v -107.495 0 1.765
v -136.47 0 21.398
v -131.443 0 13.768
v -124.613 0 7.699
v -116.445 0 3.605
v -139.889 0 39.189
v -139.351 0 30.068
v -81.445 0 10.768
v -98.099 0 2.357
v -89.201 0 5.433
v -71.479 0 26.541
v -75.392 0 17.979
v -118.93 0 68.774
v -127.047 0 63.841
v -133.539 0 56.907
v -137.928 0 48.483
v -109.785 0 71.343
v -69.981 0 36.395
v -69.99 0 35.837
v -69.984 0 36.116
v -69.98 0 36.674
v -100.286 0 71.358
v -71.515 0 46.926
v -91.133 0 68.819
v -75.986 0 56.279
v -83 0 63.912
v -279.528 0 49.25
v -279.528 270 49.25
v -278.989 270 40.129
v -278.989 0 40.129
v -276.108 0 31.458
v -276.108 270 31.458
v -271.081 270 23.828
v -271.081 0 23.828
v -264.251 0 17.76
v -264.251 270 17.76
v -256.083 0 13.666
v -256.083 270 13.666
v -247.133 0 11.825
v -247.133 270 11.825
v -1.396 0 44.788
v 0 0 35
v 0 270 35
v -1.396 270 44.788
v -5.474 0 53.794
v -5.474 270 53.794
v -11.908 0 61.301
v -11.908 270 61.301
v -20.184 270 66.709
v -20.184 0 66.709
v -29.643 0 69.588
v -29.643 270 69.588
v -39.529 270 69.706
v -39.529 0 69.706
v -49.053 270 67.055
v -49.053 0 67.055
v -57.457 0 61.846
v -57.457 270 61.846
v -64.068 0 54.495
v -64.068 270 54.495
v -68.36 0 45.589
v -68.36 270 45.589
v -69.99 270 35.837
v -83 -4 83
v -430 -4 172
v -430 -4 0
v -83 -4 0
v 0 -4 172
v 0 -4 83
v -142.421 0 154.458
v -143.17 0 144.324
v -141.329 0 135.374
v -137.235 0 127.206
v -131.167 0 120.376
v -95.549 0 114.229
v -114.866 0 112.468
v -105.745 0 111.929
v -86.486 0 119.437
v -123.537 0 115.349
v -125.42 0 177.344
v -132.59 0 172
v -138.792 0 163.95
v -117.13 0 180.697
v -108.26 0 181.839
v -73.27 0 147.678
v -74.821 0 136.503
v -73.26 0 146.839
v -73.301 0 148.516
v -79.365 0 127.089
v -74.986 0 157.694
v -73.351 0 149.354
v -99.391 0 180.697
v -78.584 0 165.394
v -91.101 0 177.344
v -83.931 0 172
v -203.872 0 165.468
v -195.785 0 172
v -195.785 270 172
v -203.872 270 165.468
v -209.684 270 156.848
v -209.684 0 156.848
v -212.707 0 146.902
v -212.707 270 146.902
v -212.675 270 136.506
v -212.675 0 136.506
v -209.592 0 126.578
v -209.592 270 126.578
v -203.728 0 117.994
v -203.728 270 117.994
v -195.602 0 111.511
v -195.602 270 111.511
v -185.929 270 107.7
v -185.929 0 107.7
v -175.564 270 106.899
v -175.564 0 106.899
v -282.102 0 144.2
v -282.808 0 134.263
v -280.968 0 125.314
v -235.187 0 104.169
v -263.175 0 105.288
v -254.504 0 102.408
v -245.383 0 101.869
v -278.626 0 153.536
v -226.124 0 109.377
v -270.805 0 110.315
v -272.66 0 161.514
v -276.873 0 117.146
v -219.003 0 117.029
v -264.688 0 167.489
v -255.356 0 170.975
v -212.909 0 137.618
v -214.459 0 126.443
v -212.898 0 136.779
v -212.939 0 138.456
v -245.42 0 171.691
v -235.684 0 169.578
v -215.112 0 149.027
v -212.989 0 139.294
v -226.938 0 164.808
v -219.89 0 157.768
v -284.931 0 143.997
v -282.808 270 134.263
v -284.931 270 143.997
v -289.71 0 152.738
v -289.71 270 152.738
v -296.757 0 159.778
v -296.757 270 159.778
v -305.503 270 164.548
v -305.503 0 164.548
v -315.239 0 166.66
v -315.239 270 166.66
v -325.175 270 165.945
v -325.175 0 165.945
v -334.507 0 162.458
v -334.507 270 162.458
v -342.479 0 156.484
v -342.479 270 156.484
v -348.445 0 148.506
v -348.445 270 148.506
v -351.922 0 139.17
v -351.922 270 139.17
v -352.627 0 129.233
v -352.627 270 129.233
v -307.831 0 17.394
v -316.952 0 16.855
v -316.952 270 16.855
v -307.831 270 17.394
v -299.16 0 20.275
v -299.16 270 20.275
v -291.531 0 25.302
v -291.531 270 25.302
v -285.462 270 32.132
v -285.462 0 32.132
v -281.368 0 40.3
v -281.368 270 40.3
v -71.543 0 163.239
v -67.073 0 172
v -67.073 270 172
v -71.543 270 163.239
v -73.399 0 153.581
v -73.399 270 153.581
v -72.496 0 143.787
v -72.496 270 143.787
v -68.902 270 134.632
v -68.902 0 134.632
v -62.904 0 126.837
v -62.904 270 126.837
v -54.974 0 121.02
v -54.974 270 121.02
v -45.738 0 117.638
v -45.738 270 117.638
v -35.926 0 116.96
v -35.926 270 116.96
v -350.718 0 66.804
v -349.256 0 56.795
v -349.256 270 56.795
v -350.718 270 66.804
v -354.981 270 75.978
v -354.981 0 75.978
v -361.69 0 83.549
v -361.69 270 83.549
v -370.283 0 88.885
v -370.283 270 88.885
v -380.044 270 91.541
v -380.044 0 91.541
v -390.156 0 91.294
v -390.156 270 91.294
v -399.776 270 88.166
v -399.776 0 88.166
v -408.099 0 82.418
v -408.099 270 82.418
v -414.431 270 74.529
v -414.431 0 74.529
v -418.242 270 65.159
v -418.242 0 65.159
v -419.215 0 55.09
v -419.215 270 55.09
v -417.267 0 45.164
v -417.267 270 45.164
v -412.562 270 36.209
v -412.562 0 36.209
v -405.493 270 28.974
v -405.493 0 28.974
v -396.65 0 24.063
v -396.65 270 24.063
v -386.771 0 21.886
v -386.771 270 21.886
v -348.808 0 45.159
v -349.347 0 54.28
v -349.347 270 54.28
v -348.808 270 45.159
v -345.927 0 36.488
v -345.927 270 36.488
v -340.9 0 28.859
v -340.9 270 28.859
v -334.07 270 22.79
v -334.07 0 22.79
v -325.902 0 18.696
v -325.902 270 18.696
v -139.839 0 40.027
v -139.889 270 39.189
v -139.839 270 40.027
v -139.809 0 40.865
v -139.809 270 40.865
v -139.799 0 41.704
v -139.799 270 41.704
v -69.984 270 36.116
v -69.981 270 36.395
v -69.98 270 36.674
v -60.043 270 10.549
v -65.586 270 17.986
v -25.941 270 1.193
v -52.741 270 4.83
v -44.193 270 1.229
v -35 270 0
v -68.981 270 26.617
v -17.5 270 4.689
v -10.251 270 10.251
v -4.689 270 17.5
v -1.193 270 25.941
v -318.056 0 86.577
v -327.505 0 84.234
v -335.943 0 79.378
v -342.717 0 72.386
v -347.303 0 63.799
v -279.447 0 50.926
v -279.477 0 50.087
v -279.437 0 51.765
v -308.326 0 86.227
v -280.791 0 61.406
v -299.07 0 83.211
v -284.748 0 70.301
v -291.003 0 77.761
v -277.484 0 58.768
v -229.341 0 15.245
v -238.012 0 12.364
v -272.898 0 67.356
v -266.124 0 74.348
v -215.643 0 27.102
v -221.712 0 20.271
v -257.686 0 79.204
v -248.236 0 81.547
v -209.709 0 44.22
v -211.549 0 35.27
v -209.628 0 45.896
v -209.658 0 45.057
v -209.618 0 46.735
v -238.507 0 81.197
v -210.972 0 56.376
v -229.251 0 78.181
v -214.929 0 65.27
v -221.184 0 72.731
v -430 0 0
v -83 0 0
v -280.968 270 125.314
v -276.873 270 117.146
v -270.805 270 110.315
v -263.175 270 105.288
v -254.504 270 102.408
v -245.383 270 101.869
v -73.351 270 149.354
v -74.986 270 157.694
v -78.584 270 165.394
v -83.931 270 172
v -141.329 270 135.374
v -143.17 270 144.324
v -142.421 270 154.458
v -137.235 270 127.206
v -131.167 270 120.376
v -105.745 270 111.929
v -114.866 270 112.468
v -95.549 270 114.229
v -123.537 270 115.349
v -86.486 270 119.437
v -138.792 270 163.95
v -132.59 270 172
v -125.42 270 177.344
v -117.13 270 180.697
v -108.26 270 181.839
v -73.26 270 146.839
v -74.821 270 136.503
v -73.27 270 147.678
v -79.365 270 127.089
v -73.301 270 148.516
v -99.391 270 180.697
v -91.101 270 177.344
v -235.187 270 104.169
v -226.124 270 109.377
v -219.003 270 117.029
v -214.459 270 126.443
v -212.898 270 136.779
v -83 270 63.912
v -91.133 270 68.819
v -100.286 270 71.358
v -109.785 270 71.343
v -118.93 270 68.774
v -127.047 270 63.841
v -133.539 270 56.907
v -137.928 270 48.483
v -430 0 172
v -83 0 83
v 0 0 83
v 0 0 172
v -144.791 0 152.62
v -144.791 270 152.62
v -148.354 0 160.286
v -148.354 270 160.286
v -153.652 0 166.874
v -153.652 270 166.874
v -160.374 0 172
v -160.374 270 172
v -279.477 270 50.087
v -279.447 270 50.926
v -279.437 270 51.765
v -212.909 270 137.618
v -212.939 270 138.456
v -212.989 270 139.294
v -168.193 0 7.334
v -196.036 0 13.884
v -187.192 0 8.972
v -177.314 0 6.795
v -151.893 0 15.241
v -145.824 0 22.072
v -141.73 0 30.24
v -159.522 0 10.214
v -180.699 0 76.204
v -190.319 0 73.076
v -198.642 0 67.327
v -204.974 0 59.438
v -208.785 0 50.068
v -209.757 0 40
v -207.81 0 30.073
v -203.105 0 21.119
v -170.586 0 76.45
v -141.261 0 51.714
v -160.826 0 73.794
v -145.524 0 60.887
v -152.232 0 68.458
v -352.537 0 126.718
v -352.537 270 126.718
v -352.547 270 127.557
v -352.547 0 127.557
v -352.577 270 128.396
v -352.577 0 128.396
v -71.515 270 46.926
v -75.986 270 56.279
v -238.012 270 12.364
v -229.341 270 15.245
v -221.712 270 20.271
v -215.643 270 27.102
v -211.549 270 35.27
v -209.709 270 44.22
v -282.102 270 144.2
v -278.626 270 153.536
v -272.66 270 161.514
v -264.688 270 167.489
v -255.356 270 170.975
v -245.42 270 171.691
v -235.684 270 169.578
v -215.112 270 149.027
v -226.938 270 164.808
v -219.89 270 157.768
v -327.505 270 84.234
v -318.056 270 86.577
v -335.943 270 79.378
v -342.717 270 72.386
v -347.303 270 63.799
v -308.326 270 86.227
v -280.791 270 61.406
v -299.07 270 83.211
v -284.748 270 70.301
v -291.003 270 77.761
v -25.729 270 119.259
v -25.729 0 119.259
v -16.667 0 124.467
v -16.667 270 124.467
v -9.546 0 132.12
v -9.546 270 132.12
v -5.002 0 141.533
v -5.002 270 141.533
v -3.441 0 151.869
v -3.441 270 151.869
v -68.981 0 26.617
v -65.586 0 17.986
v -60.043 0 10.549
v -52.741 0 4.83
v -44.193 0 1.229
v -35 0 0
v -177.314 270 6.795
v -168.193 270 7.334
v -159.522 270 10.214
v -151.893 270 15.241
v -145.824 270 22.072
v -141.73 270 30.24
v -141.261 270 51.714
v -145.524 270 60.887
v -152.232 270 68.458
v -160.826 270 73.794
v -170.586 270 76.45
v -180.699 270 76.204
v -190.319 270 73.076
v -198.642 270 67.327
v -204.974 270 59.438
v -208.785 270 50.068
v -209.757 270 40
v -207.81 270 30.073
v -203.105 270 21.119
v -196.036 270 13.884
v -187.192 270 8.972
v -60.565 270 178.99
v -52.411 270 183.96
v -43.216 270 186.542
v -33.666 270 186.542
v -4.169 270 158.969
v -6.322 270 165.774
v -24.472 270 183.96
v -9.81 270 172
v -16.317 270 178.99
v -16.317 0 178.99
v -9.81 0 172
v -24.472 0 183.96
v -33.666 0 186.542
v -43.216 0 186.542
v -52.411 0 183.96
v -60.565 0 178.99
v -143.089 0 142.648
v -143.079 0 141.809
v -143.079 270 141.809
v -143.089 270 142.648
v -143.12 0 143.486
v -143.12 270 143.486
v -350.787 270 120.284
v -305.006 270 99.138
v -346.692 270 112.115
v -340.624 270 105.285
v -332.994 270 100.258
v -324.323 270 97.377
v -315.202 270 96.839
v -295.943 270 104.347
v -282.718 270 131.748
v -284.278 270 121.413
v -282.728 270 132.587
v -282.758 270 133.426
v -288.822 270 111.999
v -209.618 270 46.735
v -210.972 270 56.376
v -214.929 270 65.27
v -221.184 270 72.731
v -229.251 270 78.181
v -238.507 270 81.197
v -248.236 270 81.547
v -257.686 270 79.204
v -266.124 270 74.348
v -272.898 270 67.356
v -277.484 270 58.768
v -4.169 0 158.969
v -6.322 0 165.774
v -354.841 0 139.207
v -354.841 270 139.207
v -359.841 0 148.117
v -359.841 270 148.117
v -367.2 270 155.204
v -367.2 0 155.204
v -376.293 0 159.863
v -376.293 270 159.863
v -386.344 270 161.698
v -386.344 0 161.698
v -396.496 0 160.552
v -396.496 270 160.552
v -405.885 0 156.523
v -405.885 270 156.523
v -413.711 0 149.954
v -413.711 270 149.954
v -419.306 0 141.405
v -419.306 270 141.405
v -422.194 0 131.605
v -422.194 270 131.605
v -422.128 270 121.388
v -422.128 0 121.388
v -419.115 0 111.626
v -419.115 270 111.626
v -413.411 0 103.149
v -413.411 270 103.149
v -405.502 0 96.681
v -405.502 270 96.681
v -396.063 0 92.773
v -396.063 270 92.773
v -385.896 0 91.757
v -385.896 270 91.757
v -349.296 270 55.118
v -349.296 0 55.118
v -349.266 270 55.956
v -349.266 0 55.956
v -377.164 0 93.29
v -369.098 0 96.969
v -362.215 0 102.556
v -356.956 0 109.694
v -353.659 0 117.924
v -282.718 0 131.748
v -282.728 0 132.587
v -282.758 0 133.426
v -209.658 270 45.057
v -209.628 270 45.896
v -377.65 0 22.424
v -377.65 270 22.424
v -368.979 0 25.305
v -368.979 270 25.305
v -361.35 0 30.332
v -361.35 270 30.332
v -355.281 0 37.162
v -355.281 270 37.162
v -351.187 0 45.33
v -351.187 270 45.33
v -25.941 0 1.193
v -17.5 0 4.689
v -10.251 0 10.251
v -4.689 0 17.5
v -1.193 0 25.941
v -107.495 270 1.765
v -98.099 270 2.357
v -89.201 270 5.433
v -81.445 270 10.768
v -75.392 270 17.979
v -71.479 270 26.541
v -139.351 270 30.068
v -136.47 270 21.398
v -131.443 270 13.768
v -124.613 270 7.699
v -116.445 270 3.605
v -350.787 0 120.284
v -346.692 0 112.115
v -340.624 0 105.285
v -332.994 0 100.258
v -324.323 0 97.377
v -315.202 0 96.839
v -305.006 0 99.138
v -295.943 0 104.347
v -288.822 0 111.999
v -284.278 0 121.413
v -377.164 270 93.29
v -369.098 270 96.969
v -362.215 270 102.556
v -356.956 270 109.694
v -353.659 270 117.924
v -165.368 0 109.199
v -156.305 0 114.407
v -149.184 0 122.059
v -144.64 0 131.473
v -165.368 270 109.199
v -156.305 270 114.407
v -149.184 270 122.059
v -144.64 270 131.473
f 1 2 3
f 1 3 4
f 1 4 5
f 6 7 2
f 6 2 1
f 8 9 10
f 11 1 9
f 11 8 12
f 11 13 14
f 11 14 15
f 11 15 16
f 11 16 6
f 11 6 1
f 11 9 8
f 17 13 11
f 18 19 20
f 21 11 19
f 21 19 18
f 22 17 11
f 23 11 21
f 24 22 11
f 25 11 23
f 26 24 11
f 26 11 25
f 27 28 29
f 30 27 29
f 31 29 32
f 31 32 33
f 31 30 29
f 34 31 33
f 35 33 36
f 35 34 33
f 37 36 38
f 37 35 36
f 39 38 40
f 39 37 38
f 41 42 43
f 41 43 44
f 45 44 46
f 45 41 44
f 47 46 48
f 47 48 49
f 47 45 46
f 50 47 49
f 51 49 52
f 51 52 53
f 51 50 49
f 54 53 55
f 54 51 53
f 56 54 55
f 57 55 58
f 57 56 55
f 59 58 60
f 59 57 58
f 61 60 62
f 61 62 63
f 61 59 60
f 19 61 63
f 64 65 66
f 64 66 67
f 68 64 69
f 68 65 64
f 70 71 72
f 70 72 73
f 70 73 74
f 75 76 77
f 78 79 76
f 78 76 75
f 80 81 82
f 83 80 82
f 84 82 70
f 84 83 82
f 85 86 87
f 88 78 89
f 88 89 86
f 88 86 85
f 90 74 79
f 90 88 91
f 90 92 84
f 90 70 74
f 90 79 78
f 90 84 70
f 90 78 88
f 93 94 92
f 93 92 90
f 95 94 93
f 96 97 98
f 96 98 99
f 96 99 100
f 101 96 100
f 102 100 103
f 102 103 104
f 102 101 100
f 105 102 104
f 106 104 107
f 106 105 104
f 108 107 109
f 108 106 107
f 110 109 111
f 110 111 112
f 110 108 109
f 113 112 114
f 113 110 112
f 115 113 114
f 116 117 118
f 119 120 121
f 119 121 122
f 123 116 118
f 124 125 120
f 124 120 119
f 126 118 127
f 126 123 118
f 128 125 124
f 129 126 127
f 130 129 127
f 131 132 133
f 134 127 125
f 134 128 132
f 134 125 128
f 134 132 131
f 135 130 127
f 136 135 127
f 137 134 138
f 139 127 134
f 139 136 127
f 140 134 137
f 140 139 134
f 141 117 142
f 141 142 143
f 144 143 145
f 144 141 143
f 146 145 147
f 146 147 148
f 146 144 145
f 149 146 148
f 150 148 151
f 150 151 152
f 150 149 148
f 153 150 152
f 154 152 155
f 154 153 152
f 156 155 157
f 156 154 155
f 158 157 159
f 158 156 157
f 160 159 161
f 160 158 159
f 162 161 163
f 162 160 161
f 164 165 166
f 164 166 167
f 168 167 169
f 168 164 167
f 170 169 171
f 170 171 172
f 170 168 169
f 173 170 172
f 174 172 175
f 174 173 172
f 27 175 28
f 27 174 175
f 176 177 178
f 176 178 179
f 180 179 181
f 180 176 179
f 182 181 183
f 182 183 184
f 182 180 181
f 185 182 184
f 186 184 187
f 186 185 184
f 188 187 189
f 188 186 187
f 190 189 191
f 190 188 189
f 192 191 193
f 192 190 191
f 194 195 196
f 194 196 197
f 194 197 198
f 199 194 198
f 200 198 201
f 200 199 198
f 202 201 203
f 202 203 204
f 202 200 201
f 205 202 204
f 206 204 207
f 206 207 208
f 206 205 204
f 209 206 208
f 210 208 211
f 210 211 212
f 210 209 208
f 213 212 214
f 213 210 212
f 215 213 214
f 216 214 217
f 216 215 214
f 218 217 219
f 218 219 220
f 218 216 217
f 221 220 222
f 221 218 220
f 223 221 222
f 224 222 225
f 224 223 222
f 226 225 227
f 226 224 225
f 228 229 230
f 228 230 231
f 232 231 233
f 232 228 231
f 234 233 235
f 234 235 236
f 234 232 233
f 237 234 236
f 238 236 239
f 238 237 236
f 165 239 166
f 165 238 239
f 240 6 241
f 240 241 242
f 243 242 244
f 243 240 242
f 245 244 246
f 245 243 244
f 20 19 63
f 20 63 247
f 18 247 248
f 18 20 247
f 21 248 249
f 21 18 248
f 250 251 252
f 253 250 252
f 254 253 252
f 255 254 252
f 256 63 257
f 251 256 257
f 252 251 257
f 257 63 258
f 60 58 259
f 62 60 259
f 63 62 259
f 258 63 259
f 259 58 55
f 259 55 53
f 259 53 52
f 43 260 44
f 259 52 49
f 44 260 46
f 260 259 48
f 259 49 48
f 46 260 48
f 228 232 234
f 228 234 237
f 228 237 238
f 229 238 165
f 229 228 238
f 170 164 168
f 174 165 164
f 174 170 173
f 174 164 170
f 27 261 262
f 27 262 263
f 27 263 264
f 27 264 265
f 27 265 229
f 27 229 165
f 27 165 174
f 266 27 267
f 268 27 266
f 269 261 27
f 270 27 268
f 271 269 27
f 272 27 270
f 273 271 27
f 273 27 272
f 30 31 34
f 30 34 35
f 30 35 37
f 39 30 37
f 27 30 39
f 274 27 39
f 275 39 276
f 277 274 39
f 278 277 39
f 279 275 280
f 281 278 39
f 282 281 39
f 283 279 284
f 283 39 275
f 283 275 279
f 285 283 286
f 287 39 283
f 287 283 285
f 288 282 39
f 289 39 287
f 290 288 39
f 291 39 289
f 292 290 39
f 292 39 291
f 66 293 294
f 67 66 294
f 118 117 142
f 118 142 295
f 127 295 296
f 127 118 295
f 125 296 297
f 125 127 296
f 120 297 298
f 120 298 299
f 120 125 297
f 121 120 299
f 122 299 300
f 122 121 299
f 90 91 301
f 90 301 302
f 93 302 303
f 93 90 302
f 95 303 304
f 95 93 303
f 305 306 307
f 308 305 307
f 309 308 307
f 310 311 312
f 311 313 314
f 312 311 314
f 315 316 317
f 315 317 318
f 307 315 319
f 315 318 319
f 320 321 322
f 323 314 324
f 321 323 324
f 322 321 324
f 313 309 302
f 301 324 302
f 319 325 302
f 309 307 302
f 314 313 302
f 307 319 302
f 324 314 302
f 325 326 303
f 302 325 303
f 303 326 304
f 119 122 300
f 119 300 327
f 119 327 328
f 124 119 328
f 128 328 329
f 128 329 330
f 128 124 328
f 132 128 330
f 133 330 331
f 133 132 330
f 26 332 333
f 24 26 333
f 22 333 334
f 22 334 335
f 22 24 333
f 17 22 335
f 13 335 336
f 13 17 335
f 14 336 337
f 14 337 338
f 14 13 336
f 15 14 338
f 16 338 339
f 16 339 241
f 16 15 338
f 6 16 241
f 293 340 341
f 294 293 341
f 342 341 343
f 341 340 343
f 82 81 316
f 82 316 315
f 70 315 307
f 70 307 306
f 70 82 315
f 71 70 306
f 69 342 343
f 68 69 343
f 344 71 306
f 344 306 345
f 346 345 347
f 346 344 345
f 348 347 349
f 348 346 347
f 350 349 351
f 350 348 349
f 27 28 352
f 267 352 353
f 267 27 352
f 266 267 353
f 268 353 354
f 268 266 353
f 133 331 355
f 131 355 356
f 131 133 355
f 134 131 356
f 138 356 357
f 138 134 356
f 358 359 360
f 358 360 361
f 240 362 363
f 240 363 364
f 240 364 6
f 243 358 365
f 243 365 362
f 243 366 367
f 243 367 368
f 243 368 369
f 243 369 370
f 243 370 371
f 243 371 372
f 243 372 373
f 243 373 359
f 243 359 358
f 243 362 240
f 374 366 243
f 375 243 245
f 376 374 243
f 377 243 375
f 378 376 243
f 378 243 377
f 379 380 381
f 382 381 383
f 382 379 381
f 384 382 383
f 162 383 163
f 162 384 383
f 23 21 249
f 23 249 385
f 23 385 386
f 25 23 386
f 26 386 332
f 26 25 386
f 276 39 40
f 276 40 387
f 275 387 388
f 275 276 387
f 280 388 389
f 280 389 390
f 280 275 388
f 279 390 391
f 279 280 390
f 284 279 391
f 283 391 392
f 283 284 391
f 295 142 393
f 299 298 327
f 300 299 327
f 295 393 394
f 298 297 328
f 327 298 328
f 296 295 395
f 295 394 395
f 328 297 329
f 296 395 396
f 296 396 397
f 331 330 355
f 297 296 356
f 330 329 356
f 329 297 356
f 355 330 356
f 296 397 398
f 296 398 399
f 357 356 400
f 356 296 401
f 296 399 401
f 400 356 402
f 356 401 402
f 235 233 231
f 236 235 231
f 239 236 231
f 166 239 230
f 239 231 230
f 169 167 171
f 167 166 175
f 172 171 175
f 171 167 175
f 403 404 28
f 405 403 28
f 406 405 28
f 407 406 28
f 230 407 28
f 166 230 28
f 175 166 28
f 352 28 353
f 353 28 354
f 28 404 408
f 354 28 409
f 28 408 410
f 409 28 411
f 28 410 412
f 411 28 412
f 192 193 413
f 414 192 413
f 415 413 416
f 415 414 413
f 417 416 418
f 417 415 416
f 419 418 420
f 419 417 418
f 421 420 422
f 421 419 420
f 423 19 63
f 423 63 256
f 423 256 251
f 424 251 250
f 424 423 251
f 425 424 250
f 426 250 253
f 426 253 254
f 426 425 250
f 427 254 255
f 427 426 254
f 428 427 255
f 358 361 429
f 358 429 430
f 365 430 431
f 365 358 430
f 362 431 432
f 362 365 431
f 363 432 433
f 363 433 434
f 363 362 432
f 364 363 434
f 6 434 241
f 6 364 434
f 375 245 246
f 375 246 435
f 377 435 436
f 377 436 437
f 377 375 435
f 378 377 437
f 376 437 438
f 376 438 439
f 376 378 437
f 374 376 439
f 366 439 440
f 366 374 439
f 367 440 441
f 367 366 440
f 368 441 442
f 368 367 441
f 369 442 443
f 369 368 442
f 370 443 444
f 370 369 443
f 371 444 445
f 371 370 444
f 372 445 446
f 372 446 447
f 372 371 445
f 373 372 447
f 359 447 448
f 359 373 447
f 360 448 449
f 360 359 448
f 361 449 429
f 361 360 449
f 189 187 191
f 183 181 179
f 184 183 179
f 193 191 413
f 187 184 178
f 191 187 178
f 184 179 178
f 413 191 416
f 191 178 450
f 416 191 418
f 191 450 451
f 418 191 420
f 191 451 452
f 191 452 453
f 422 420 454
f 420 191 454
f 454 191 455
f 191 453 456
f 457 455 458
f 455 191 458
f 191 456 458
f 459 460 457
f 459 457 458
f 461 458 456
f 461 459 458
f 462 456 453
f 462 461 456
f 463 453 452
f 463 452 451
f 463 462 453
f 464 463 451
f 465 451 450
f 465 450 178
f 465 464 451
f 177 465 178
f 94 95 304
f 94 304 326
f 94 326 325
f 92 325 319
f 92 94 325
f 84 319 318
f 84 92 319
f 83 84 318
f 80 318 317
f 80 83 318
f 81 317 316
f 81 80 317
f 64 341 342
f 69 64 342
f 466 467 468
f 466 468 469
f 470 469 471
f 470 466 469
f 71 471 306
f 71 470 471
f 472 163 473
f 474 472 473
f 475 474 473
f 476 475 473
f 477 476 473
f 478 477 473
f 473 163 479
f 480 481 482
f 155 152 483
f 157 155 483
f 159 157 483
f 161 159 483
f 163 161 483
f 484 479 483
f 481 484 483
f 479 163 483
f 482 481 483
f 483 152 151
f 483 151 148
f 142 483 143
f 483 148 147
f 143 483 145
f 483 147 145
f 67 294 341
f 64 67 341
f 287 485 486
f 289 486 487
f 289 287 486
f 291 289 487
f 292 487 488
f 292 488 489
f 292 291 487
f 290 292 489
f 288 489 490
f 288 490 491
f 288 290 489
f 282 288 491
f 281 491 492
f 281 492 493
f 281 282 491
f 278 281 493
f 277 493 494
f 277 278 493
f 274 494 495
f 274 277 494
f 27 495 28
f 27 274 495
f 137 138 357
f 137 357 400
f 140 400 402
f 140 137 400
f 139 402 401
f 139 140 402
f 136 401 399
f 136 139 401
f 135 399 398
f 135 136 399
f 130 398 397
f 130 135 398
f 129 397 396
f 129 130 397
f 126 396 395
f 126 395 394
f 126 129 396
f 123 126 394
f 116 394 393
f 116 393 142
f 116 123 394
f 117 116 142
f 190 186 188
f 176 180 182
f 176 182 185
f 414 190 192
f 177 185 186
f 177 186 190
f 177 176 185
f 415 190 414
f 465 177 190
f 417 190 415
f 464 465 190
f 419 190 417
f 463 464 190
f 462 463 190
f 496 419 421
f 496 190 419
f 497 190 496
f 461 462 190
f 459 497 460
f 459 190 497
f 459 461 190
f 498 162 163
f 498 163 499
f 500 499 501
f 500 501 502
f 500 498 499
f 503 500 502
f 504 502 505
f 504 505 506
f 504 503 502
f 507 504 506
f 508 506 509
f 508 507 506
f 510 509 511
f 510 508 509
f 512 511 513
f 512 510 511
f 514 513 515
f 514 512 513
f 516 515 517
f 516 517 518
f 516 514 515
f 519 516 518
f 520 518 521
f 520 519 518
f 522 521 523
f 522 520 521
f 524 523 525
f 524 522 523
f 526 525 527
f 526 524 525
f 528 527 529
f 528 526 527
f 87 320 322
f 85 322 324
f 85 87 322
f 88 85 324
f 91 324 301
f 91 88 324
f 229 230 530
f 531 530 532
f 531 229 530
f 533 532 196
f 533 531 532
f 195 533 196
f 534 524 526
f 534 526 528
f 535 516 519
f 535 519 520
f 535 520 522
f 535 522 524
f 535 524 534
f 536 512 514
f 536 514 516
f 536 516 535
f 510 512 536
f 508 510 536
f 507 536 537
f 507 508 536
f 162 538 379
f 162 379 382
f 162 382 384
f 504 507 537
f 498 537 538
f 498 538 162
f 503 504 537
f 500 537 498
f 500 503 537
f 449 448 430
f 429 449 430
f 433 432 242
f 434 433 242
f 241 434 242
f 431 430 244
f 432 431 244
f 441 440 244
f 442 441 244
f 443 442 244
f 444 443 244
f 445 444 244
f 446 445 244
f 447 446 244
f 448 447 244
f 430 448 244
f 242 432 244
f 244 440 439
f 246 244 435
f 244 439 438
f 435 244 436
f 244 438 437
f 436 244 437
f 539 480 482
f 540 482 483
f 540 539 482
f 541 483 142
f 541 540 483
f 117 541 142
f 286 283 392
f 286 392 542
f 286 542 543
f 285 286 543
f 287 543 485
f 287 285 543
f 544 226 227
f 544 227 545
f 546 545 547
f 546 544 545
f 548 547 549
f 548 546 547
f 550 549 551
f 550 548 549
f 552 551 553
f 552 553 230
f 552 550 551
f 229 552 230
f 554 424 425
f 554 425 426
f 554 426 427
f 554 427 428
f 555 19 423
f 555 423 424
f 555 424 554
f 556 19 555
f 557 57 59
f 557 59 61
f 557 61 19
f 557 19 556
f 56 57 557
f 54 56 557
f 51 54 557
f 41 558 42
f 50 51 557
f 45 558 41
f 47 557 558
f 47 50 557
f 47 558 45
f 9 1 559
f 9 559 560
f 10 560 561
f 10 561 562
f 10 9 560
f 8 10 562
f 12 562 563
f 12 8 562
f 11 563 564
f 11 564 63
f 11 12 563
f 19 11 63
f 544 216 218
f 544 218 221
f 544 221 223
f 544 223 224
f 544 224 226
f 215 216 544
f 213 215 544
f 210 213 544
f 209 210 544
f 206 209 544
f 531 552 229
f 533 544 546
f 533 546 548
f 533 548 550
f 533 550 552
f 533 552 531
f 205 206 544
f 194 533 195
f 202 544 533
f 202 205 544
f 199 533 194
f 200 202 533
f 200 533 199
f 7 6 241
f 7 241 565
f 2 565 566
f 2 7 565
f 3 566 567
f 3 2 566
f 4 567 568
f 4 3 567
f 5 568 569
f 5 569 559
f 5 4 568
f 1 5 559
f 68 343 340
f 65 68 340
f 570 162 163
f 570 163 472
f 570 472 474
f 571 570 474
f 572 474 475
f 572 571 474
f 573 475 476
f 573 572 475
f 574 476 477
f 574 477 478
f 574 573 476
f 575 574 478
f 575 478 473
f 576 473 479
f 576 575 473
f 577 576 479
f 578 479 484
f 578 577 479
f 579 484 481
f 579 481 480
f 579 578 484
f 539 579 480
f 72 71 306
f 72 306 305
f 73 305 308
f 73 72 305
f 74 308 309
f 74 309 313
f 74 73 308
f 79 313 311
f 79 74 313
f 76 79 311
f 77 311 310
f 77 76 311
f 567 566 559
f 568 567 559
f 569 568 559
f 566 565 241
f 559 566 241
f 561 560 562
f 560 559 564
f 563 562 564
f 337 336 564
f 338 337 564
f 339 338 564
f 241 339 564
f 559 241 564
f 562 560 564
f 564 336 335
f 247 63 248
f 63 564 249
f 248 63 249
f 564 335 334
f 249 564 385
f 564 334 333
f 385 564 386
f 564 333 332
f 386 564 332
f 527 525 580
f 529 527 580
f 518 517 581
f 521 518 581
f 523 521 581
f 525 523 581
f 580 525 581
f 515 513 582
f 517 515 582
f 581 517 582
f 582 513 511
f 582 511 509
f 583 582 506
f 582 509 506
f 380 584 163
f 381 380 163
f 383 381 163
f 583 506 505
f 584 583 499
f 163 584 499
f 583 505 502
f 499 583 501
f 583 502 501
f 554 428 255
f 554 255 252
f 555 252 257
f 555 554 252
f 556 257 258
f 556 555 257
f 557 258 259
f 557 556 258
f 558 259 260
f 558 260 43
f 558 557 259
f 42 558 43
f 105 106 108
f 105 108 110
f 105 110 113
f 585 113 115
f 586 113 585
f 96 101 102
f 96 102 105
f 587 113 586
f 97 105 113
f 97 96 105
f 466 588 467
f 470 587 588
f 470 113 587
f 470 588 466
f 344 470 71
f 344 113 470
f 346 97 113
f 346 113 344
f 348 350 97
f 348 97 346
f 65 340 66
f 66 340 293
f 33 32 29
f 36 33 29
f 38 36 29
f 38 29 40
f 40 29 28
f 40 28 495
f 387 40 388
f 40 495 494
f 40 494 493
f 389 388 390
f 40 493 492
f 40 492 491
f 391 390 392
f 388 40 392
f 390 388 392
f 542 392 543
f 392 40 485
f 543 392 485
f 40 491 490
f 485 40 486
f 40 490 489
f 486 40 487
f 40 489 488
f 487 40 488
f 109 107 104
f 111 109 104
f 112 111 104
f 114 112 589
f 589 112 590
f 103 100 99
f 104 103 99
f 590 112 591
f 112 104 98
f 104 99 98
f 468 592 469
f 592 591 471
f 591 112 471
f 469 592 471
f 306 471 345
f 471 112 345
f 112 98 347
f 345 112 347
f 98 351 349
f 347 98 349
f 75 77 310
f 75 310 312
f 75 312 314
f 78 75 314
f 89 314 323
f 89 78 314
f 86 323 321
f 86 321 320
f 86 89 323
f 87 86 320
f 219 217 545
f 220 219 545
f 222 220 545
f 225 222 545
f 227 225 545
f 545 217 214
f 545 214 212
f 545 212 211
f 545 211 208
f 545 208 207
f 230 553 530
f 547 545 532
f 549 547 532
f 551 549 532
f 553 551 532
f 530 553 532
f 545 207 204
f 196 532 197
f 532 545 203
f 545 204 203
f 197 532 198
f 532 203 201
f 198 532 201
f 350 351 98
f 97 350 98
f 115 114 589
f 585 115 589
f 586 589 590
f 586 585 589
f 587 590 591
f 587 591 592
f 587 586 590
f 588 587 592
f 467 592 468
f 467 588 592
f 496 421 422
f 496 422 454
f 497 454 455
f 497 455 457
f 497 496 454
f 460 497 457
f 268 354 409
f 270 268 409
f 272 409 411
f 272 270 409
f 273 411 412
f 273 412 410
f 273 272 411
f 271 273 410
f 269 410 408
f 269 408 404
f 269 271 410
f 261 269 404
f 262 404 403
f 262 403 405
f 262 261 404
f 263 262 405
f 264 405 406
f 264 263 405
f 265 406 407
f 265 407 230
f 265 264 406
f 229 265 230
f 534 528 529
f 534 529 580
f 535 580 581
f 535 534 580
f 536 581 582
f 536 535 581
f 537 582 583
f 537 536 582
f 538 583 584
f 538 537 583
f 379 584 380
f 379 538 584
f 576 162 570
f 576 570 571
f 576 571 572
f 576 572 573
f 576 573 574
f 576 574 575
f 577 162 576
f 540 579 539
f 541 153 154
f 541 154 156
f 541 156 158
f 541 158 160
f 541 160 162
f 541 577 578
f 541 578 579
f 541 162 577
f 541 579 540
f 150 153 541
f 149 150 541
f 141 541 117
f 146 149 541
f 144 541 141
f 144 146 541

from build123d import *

# Parameters (mm, degrees)
F1_DEPTH = 4
F2_DEPTH = 270


with BuildPart() as f1:
    # F0 (on Front) → F1 (new body)
    with BuildSketch(Plane.XZ):
        with BuildLine():
            Line((-195.7849764046, 172), (-430, 172))
            Line((-430, 172), (-430, 25))
            Line((-430, 25), (-386.7711960698, 21.8855328581))
            ThreePointArc((-386.7711960698, 21.8855328581), (-419.2533574917, 57.2332605199), (-385.8963182023, 91.7565945325))
            ThreePointArc((-385.8963182023, 91.7565945325), (-413.7108642591, 149.9539874789), (-352.6270210914, 129.2332340666))
            ThreePointArc((-352.6270210914, 129.2332340666), (-320.2326008573, 166.6578457159), (-282.8079894646, 134.2634251853))
            ThreePointArc((-282.8079894646, 134.2634251853), (-250.4135683653, 171.6880353767), (-212.9889577288, 139.2936147916))
            ThreePointArc((-212.9889577288, 139.2936147916), (-209.055445323, 158.102487295), (-195.7849764046, 172))
        make_face()
        with BuildLine():
            Line((-160.373907248, 172), (-195.7849764046, 172))
            ThreePointArc((-195.7849764046, 172), (-209.055445323, 158.102487295), (-212.9889577288, 139.2936147916))
            ThreePointArc((-212.9889577288, 139.2936147916), (-200.9857572933, 115.3455136972), (-175.5643482834, 106.8991931564))
            ThreePointArc((-175.5643482834, 106.8991931564), (-152.4569100037, 117.9657675391), (-143.0794418263, 141.8087091151))
            ThreePointArc((-143.0794418263, 141.8087091151), (-143.1020701829, 143.0670703178), (-143.169925993, 144.3238043979))
            ThreePointArc((-143.169925993, 144.3238043979), (-148.3543878616, 160.286294639), (-160.373907248, 172))
        make_face()
        Polygon((-386.7711960698, 21.8855328581), (-430, 25), (-430, 0), (-83, 0), (-107.4950686991, 1.764774402), (-177.3141012878, 6.7949640697), (-247.1331326016, 11.8251536457), (-316.9521645982, 16.8553432708), align=None)
        with BuildLine():
            Line((-132.5897952544, 172), (-160.373907248, 172))
            ThreePointArc((-160.373907248, 172), (-148.3543878616, 160.286294639), (-143.169925993, 144.3238043979))
            ThreePointArc((-143.169925993, 144.3238043979), (-140.9529902982, 159.3367065037), (-132.5897952544, 172))
        make_face()
        with BuildLine():
            ThreePointArc((-175.5643482834, 106.8991931564), (-200.9857572933, 115.3455136972), (-212.9889577288, 139.2936147916))
            ThreePointArc((-212.9889577288, 139.2936147916), (-212.9211019187, 138.0368807115), (-212.8984735621, 136.7785195088))
            ThreePointArc((-212.8984735621, 136.7785195088), (-222.2759410866, 112.9355786344), (-245.3833781073, 101.8690036878))
            Line((-245.3833781073, 101.8690036878), (-175.5643482834, 106.8991931564))
        make_face()
        with BuildLine():
            ThreePointArc((-212.8984735621, 136.7785195088), (-212.9211019187, 138.0368807115), (-212.9889577288, 139.2936147916))
            ThreePointArc((-212.9889577288, 139.2936147916), (-250.4135683653, 171.6880353767), (-282.8079894646, 134.2634251853))
            ThreePointArc((-282.8079894646, 134.2634251853), (-270.8047883044, 110.3153234636), (-245.3833781073, 101.8690036878))
            ThreePointArc((-245.3833781073, 101.8690036878), (-222.2759410866, 112.9355786344), (-212.8984735621, 136.7785195088))
        make_face()
        with BuildLine():
            ThreePointArc((-349.3465849767, 54.2799543745), (-361.3497860368, 30.3318527395), (-386.7711960698, 21.8855328581))
            Line((-386.7711960698, 21.8855328581), (-316.9521645982, 16.8553432708))
            ThreePointArc((-316.9521645982, 16.8553432708), (-340.9002655033, 28.858544713), (-349.3465849767, 54.2799543745))
        make_face()
        with BuildLine():
            ThreePointArc((-385.8963182023, 91.7565945325), (-419.2533574917, 57.2332605199), (-386.7711960698, 21.8855328581))
            ThreePointArc((-386.7711960698, 21.8855328581), (-361.3497860368, 30.3318527395), (-349.3465849767, 54.2799543745))
            ThreePointArc((-349.3465849767, 54.2799543745), (-349.2787292185, 55.5366879759), (-349.2561008792, 56.795048698))
            ThreePointArc((-349.2561008792, 56.795048698), (-360.0942260172, 82.1170510508), (-385.8963182023, 91.7565945325))
        make_face()
        with BuildLine():
            Line((-83.9310249267, 172), (-132.5897952544, 172))
            ThreePointArc((-132.5897952544, 172), (-140.9529902982, 159.3367065037), (-143.169925993, 144.3238043979))
            ThreePointArc((-143.169925993, 144.3238043979), (-131.166725929, 120.3757036251), (-105.7453175279, 111.9293826921))
            ThreePointArc((-105.7453175279, 111.9293826921), (-82.6378786027, 122.9959567856), (-73.2604100905, 146.8388987214))
            ThreePointArc((-73.2604100905, 146.8388987214), (-73.2830384471, 148.0972599242), (-73.3508942572, 149.3539940042))
            ThreePointArc((-73.3508942572, 149.3539940042), (-76.5504393443, 161.6536803692), (-83.9310249267, 172))
        make_face()
        with BuildLine():
            ThreePointArc((-105.7453175279, 111.9293826921), (-131.166725929, 120.3757036251), (-143.169925993, 144.3238043979))
            ThreePointArc((-143.169925993, 144.3238043979), (-143.1020701829, 143.0670703178), (-143.0794418263, 141.8087091151))
            ThreePointArc((-143.0794418263, 141.8087091151), (-152.4569100037, 117.9657675391), (-175.5643482834, 106.8991931564))
            Line((-175.5643482834, 106.8991931564), (-105.7453175279, 111.9293826921))
        make_face()
        with BuildLine():
            ThreePointArc((-245.3833781073, 101.8690036878), (-270.8047883044, 110.3153234636), (-282.8079894646, 134.2634251853))
            ThreePointArc((-282.8079894646, 134.2634251853), (-282.7401336545, 133.0066911052), (-282.7175052979, 131.7483299025))
            ThreePointArc((-282.7175052979, 131.7483299025), (-292.0949733471, 107.9053884642), (-315.2024113796, 96.8388139708))
            Line((-315.2024113796, 96.8388139708), (-245.3833781073, 101.8690036878))
        make_face()
        with BuildLine():
            ThreePointArc((-282.7175052979, 131.7483299025), (-282.7401336545, 133.0066911052), (-282.8079894646, 134.2634251853))
            ThreePointArc((-282.8079894646, 134.2634251853), (-320.2326008573, 166.6578457159), (-352.6270210914, 129.2332340666))
            ThreePointArc((-352.6270210914, 129.2332340666), (-340.6238200494, 105.2851338652), (-315.2024113796, 96.8388139708))
            ThreePointArc((-315.2024113796, 96.8388139708), (-292.0949733471, 107.9053884642), (-282.7175052979, 131.7483299025))
        make_face()
        with BuildLine():
            Line((-105.7453175279, 111.9293826921), (-175.5643482834, 106.8991931564))
            Line((-175.5643482834, 106.8991931564), (-245.3833781073, 101.8690036878))
            Line((-245.3833781073, 101.8690036878), (-315.2024113796, 96.8388139708))
            ThreePointArc((-315.2024113796, 96.8388139708), (-340.6238200494, 105.2851338652), (-352.6270210914, 129.2332340666))
            ThreePointArc((-352.6270210914, 129.2332340666), (-352.559165363, 127.9765007412), (-352.5365370337, 126.7181402961))
            ThreePointArc((-352.5365370337, 126.7181402961), (-362.2145341598, 102.5562659804), (-385.8963182023, 91.7565945325))
            ThreePointArc((-385.8963182023, 91.7565945325), (-360.0942260172, 82.1170510508), (-349.2561008792, 56.795048698))
            ThreePointArc((-349.2561008792, 56.795048698), (-349.2787292185, 55.5366879759), (-349.3465849767, 54.2799543745))
            ThreePointArc((-349.3465849767, 54.2799543745), (-313.1787079407, 86.7422307352), (-279.4370691434, 51.7648590917))
            ThreePointArc((-279.4370691434, 51.7648590917), (-279.4596974729, 50.5064986405), (-279.527553202, 49.249765309))
            ThreePointArc((-279.527553202, 49.249765309), (-243.359675934, 81.7120411191), (-209.6180374076, 46.7346694854))
            ThreePointArc((-209.6180374076, 46.7346694854), (-209.6406657369, 45.4763090403), (-209.7085214653, 44.2195757149))
            ThreePointArc((-209.7085214653, 44.2195757149), (-173.540644192, 76.6818515125), (-139.7990056718, 41.7044798791))
            ThreePointArc((-139.7990056718, 41.7044798791), (-139.8216340111, 40.4461191571), (-139.8894897693, 39.189385556))
            ThreePointArc((-139.8894897693, 39.189385556), (-118.9296132608, 68.7742523087), (-83, 63.9117781483))
            Line((-83, 63.9117781483), (-83, 83))
            Line((-83, 83), (0, 83))
            Line((0, 83), (0, 119.5479214189))
            Line((0, 119.5479214189), (-35.9262829, 116.9595725068))
            Line((-35.9262829, 116.9595725068), (-105.7453175279, 111.9293826921))
        make_face()
        with BuildLine():
            Line((-107.4950686991, 1.764774402), (-83, 0))
            Line((-83, 0), (-83, 9.4368023971))
            ThreePointArc((-83, 9.4368023971), (-94.5188371099, 3.2742211664), (-107.4950686991, 1.764774402))
        make_face()
        with BuildLine():
            ThreePointArc((-279.527553202, 49.249765309), (-291.5307541961, 25.3016632239), (-316.9521645982, 16.8553432708))
            Line((-316.9521645982, 16.8553432708), (-247.1331326016, 11.8251536457))
            ThreePointArc((-247.1331326016, 11.8251536457), (-271.0812338594, 23.8283552128), (-279.527553202, 49.249765309))
        make_face()
        with BuildLine():
            ThreePointArc((-349.3465849767, 54.2799543745), (-340.9002655033, 28.858544713), (-316.9521645982, 16.8553432708))
            ThreePointArc((-316.9521645982, 16.8553432708), (-291.5307541961, 25.3016632239), (-279.527553202, 49.249765309))
            ThreePointArc((-279.527553202, 49.249765309), (-279.4596974729, 50.5064986405), (-279.4370691434, 51.7648590917))
            ThreePointArc((-279.4370691434, 51.7648590917), (-313.1787079407, 86.7422307352), (-349.3465849767, 54.2799543745))
        make_face()
        with BuildLine():
            ThreePointArc((-352.6270210914, 129.2332340666), (-413.7108642591, 149.9539874789), (-385.8963182023, 91.7565945325))
            ThreePointArc((-385.8963182023, 91.7565945325), (-362.2145341598, 102.5562659804), (-352.5365370337, 126.7181402961))
            ThreePointArc((-352.5365370337, 126.7181402961), (-352.559165363, 127.9765007412), (-352.6270210914, 129.2332340666))
        make_face()
        with BuildLine():
            Line((-67.0725920077, 172), (-83.9310249267, 172))
            ThreePointArc((-83.9310249267, 172), (-76.5504393443, 161.6536803692), (-73.3508942572, 149.3539940042))
            ThreePointArc((-73.3508942572, 149.3539940042), (-72.1692077394, 161.2196778814), (-67.0725920077, 172))
        make_face()
        with BuildLine():
            ThreePointArc((-73.2604100905, 146.8388987214), (-82.6378786027, 122.9959567856), (-105.7453175279, 111.9293826921))
            Line((-105.7453175279, 111.9293826921), (-35.9262829, 116.9595725068))
            ThreePointArc((-35.9262829, 116.9595725068), (-61.347693097, 125.4058922826), (-73.3508942572, 149.3539940042))
            ThreePointArc((-73.3508942572, 149.3539940042), (-73.2830384471, 148.0972599242), (-73.2604100905, 146.8388987214))
        make_face()
        with BuildLine():
            Line((-177.3141012878, 6.7949640697), (-107.4950686991, 1.764774402))
            ThreePointArc((-107.4950686991, 1.764774402), (-131.4431700691, 13.767975632), (-139.8894897693, 39.189385556))
            ThreePointArc((-139.8894897693, 39.189385556), (-151.8926909904, 15.2412837811), (-177.3141012878, 6.7949640697))
        make_face()
        with BuildLine():
            ThreePointArc((-139.8894897693, 39.189385556), (-131.4431700691, 13.767975632), (-107.4950686991, 1.764774402))
            ThreePointArc((-107.4950686991, 1.764774402), (-94.5188371099, 3.2742211664), (-83, 9.4368023971))
            Line((-83, 9.4368023971), (-83, 63.9117781483))
            ThreePointArc((-83, 63.9117781483), (-118.9296132608, 68.7742523087), (-139.8894897693, 39.189385556))
        make_face()
        with BuildLine():
            ThreePointArc((-279.527553202, 49.249765309), (-271.0812338594, 23.8283552128), (-247.1331326016, 11.8251536457))
            ThreePointArc((-247.1331326016, 11.8251536457), (-221.7117223568, 20.2714737072), (-209.7085214653, 44.2195757149))
            ThreePointArc((-209.7085214653, 44.2195757149), (-209.6406657369, 45.4763090403), (-209.6180374076, 46.7346694854))
            ThreePointArc((-209.6180374076, 46.7346694854), (-243.359675934, 81.7120411191), (-279.527553202, 49.249765309))
        make_face()
        with BuildLine():
            ThreePointArc((-209.7085214653, 44.2195757149), (-221.7117223568, 20.2714737072), (-247.1331326016, 11.8251536457))
            Line((-247.1331326016, 11.8251536457), (-177.3141012878, 6.7949640697))
            ThreePointArc((-177.3141012878, 6.7949640697), (-201.2622022661, 18.7981657711), (-209.7085214653, 44.2195757149))
        make_face()
        with BuildLine():
            Line((-9.8101647017, 172), (-67.0725920077, 172))
            ThreePointArc((-67.0725920077, 172), (-72.1692077394, 161.2196778814), (-73.3508942572, 149.3539940042))
            ThreePointArc((-73.3508942572, 149.3539940042), (-61.347693097, 125.4058922826), (-35.9262829, 116.9595725068))
            ThreePointArc((-35.9262829, 116.9595725068), (-12.8188458792, 128.0261474533), (-3.4413783547, 151.8690883278))
            ThreePointArc((-3.4413783547, 151.8690883278), (-5.0715380955, 162.426254665), (-9.8101647017, 172))
        make_face()
        with BuildLine():
            ThreePointArc((-3.4413783547, 151.8690883278), (-12.8188458792, 128.0261474533), (-35.9262829, 116.9595725068))
            Line((-35.9262829, 116.9595725068), (0, 119.5479214189))
            Line((0, 119.5479214189), (0, 172))
            Line((0, 172), (-9.8101647017, 172))
            ThreePointArc((-9.8101647017, 172), (-5.0715380955, 162.426254665), (-3.4413783547, 151.8690883278))
        make_face()
        with BuildLine():
            ThreePointArc((-177.3141012878, 6.7949640697), (-151.8926909904, 15.2412837811), (-139.8894897693, 39.189385556))
            ThreePointArc((-139.8894897693, 39.189385556), (-139.8216340111, 40.4461191571), (-139.7990056718, 41.7044798791))
            ThreePointArc((-139.7990056718, 41.7044798791), (-173.540644192, 76.6818515125), (-209.7085214653, 44.2195757149))
            ThreePointArc((-209.7085214653, 44.2195757149), (-201.2622022661, 18.7981657711), (-177.3141012878, 6.7949640697))
        make_face()
    extrude(amount=F1_DEPTH)


with BuildPart() as f2:
    # F0 (on Front) → F2 (new body)
    with BuildSketch(Plane.XZ):
        with BuildLine():
            ThreePointArc((-385.8963182023, 91.7565945325), (-419.2533574917, 57.2332605199), (-386.7711960698, 21.8855328581))
            ThreePointArc((-386.7711960698, 21.8855328581), (-361.3497860368, 30.3318527395), (-349.3465849767, 54.2799543745))
            ThreePointArc((-349.3465849767, 54.2799543745), (-349.2787292185, 55.5366879759), (-349.2561008792, 56.795048698))
            ThreePointArc((-349.2561008792, 56.795048698), (-360.0942260172, 82.1170510508), (-385.8963182023, 91.7565945325))
        make_face()
    extrude(amount=-F2_DEPTH)


with BuildPart() as f2b:
    # F0 (on Front) → F2, piece 2 (new body)
    with BuildSketch(Plane.XZ):
        with BuildLine():
            ThreePointArc((-349.3465849767, 54.2799543745), (-340.9002655033, 28.858544713), (-316.9521645982, 16.8553432708))
            ThreePointArc((-316.9521645982, 16.8553432708), (-291.5307541961, 25.3016632239), (-279.527553202, 49.249765309))
            ThreePointArc((-279.527553202, 49.249765309), (-279.4596974729, 50.5064986405), (-279.4370691434, 51.7648590917))
            ThreePointArc((-279.4370691434, 51.7648590917), (-313.1787079407, 86.7422307352), (-349.3465849767, 54.2799543745))
        make_face()
    extrude(amount=-F2_DEPTH)


with BuildPart() as f2c:
    # F0 (on Front) → F2, piece 3 (new body)
    with BuildSketch(Plane.XZ):
        with BuildLine():
            ThreePointArc((-279.527553202, 49.249765309), (-271.0812338594, 23.8283552128), (-247.1331326016, 11.8251536457))
            ThreePointArc((-247.1331326016, 11.8251536457), (-221.7117223568, 20.2714737072), (-209.7085214653, 44.2195757149))
            ThreePointArc((-209.7085214653, 44.2195757149), (-209.6406657369, 45.4763090403), (-209.6180374076, 46.7346694854))
            ThreePointArc((-209.6180374076, 46.7346694854), (-243.359675934, 81.7120411191), (-279.527553202, 49.249765309))
        make_face()
    extrude(amount=-F2_DEPTH)


with BuildPart() as f2d:
    # F0 (on Front) → F2, piece 4 (new body)
    with BuildSketch(Plane.XZ):
        with BuildLine():
            ThreePointArc((-177.3141012878, 6.7949640697), (-151.8926909904, 15.2412837811), (-139.8894897693, 39.189385556))
            ThreePointArc((-139.8894897693, 39.189385556), (-139.8216340111, 40.4461191571), (-139.7990056718, 41.7044798791))
            ThreePointArc((-139.7990056718, 41.7044798791), (-173.540644192, 76.6818515125), (-209.7085214653, 44.2195757149))
            ThreePointArc((-209.7085214653, 44.2195757149), (-201.2622022661, 18.7981657711), (-177.3141012878, 6.7949640697))
        make_face()
    extrude(amount=-F2_DEPTH)


with BuildPart() as f2e:
    # F0 (on Front) → F2, piece 5 (new body)
    with BuildSketch(Plane.XZ):
        with BuildLine():
            ThreePointArc((-139.8894897693, 39.189385556), (-131.4431700691, 13.767975632), (-107.4950686991, 1.764774402))
            ThreePointArc((-107.4950686991, 1.764774402), (-94.5188371099, 3.2742211664), (-83, 9.4368023971))
            Line((-83, 9.4368023971), (-83, 63.9117781483))
            ThreePointArc((-83, 63.9117781483), (-118.9296132608, 68.7742523087), (-139.8894897693, 39.189385556))
        make_face()
        with BuildLine():
            Line((-83, 63.9117781483), (-83, 9.4368023971))
            ThreePointArc((-83, 9.4368023971), (-73.5850916032, 21.2029825287), (-69.989986966, 35.8371452194))
            ThreePointArc((-69.989986966, 35.8371452194), (-69.982477283, 36.2556878059), (-69.979973936, 36.6742902727))
            ThreePointArc((-69.979973936, 36.6742902727), (-73.402299166, 51.7690064383), (-83, 63.9117781483))
        make_face()
    extrude(amount=-F2_DEPTH)


with BuildPart() as f2f:
    # F0 (on Front) → F2, piece 6 (new body)
    with BuildSketch(Plane.XZ):
        with BuildLine():
            ThreePointArc((-69.989986966, 35.8371452194), (-60.0429639642, 10.5490295512), (-35.0000001584, 0))
            ThreePointArc((-35.0000001584, 0), (-10.2512627145, 10.2512626025), (0, 35))
            ThreePointArc((0, 35), (-34.5813974501, 69.997496652), (-69.989986966, 35.8371452194))
        make_face()
    extrude(amount=-F2_DEPTH)


with BuildPart() as f2g:
    # F0 (on Front) → F2, piece 7 (new body)
    with BuildSketch(Plane.XZ):
        with BuildLine():
            Line((-9.8101647017, 172), (-67.0725920077, 172))
            ThreePointArc((-67.0725920077, 172), (-72.1692077394, 161.2196778814), (-73.3508942572, 149.3539940042))
            ThreePointArc((-73.3508942572, 149.3539940042), (-61.347693097, 125.4058922826), (-35.9262829, 116.9595725068))
            ThreePointArc((-35.9262829, 116.9595725068), (-12.8188458792, 128.0261474533), (-3.4413783547, 151.8690883278))
            ThreePointArc((-3.4413783547, 151.8690883278), (-5.0715380955, 162.426254665), (-9.8101647017, 172))
        make_face()
        with BuildLine():
            ThreePointArc((-9.8101647017, 172), (-38.4413783547, 186.8690883278), (-67.0725920077, 172))
            Line((-67.0725920077, 172), (-9.8101647017, 172))
        make_face()
    extrude(amount=-F2_DEPTH)


with BuildPart() as f2h:
    # F0 (on Front) → F2, piece 8 (new body)
    with BuildSketch(Plane.XZ):
        with BuildLine():
            Line((-160.373907248, 172), (-195.7849764046, 172))
            ThreePointArc((-195.7849764046, 172), (-209.055445323, 158.102487295), (-212.9889577288, 139.2936147916))
            ThreePointArc((-212.9889577288, 139.2936147916), (-200.9857572933, 115.3455136972), (-175.5643482834, 106.8991931564))
            ThreePointArc((-175.5643482834, 106.8991931564), (-152.4569100037, 117.9657675391), (-143.0794418263, 141.8087091151))
            ThreePointArc((-143.0794418263, 141.8087091151), (-143.1020701829, 143.0670703178), (-143.169925993, 144.3238043979))
            ThreePointArc((-143.169925993, 144.3238043979), (-148.3543878616, 160.286294639), (-160.373907248, 172))
        make_face()
    extrude(amount=-F2_DEPTH)


with BuildPart() as f2i:
    # F0 (on Front) → F2, piece 9 (new body)
    with BuildSketch(Plane.XZ):
        with BuildLine():
            ThreePointArc((-212.8984735621, 136.7785195088), (-212.9211019187, 138.0368807115), (-212.9889577288, 139.2936147916))
            ThreePointArc((-212.9889577288, 139.2936147916), (-250.4135683653, 171.6880353767), (-282.8079894646, 134.2634251853))
            ThreePointArc((-282.8079894646, 134.2634251853), (-270.8047883044, 110.3153234636), (-245.3833781073, 101.8690036878))
            ThreePointArc((-245.3833781073, 101.8690036878), (-222.2759410866, 112.9355786344), (-212.8984735621, 136.7785195088))
        make_face()
    extrude(amount=-F2_DEPTH)


with BuildPart() as f2j:
    # F0 (on Front) → F2, piece 10 (new body)
    with BuildSketch(Plane.XZ):
        with BuildLine():
            ThreePointArc((-282.7175052979, 131.7483299025), (-282.7401336545, 133.0066911052), (-282.8079894646, 134.2634251853))
            ThreePointArc((-282.8079894646, 134.2634251853), (-320.2326008573, 166.6578457159), (-352.6270210914, 129.2332340666))
            ThreePointArc((-352.6270210914, 129.2332340666), (-340.6238200494, 105.2851338652), (-315.2024113796, 96.8388139708))
            ThreePointArc((-315.2024113796, 96.8388139708), (-292.0949733471, 107.9053884642), (-282.7175052979, 131.7483299025))
        make_face()
    extrude(amount=-F2_DEPTH)


with BuildPart() as f2k:
    # F0 (on Front) → F2, piece 11 (new body)
    with BuildSketch(Plane.XZ):
        with BuildLine():
            ThreePointArc((-352.6270210914, 129.2332340666), (-413.7108642591, 149.9539874789), (-385.8963182023, 91.7565945325))
            ThreePointArc((-385.8963182023, 91.7565945325), (-362.2145341598, 102.5562659804), (-352.5365370337, 126.7181402961))
            ThreePointArc((-352.5365370337, 126.7181402961), (-352.559165363, 127.9765007412), (-352.6270210914, 129.2332340666))
        make_face()
    extrude(amount=-F2_DEPTH)


with BuildPart() as f2l:
    # F0 (on Front) → F2, piece 12 (new body)
    with BuildSketch(Plane.XZ):
        with BuildLine():
            Line((-83.9310249267, 172), (-132.5897952544, 172))
            ThreePointArc((-132.5897952544, 172), (-140.9529902982, 159.3367065037), (-143.169925993, 144.3238043979))
            ThreePointArc((-143.169925993, 144.3238043979), (-131.166725929, 120.3757036251), (-105.7453175279, 111.9293826921))
            ThreePointArc((-105.7453175279, 111.9293826921), (-82.6378786027, 122.9959567856), (-73.2604100905, 146.8388987214))
            ThreePointArc((-73.2604100905, 146.8388987214), (-73.2830384471, 148.0972599242), (-73.3508942572, 149.3539940042))
            ThreePointArc((-73.3508942572, 149.3539940042), (-76.5504393443, 161.6536803692), (-83.9310249267, 172))
        make_face()
        with BuildLine():
            ThreePointArc((-83.9310249267, 172), (-108.2604100905, 181.8388987214), (-132.5897952544, 172))
            Line((-132.5897952544, 172), (-83.9310249267, 172))
        make_face()
    extrude(amount=-F2_DEPTH)


solid = Compound([f1.part, f2.part, f2b.part, f2c.part, f2d.part, f2e.part, f2f.part, f2g.part, f2h.part, f2i.part, f2j.part, f2k.part, f2l.part])
